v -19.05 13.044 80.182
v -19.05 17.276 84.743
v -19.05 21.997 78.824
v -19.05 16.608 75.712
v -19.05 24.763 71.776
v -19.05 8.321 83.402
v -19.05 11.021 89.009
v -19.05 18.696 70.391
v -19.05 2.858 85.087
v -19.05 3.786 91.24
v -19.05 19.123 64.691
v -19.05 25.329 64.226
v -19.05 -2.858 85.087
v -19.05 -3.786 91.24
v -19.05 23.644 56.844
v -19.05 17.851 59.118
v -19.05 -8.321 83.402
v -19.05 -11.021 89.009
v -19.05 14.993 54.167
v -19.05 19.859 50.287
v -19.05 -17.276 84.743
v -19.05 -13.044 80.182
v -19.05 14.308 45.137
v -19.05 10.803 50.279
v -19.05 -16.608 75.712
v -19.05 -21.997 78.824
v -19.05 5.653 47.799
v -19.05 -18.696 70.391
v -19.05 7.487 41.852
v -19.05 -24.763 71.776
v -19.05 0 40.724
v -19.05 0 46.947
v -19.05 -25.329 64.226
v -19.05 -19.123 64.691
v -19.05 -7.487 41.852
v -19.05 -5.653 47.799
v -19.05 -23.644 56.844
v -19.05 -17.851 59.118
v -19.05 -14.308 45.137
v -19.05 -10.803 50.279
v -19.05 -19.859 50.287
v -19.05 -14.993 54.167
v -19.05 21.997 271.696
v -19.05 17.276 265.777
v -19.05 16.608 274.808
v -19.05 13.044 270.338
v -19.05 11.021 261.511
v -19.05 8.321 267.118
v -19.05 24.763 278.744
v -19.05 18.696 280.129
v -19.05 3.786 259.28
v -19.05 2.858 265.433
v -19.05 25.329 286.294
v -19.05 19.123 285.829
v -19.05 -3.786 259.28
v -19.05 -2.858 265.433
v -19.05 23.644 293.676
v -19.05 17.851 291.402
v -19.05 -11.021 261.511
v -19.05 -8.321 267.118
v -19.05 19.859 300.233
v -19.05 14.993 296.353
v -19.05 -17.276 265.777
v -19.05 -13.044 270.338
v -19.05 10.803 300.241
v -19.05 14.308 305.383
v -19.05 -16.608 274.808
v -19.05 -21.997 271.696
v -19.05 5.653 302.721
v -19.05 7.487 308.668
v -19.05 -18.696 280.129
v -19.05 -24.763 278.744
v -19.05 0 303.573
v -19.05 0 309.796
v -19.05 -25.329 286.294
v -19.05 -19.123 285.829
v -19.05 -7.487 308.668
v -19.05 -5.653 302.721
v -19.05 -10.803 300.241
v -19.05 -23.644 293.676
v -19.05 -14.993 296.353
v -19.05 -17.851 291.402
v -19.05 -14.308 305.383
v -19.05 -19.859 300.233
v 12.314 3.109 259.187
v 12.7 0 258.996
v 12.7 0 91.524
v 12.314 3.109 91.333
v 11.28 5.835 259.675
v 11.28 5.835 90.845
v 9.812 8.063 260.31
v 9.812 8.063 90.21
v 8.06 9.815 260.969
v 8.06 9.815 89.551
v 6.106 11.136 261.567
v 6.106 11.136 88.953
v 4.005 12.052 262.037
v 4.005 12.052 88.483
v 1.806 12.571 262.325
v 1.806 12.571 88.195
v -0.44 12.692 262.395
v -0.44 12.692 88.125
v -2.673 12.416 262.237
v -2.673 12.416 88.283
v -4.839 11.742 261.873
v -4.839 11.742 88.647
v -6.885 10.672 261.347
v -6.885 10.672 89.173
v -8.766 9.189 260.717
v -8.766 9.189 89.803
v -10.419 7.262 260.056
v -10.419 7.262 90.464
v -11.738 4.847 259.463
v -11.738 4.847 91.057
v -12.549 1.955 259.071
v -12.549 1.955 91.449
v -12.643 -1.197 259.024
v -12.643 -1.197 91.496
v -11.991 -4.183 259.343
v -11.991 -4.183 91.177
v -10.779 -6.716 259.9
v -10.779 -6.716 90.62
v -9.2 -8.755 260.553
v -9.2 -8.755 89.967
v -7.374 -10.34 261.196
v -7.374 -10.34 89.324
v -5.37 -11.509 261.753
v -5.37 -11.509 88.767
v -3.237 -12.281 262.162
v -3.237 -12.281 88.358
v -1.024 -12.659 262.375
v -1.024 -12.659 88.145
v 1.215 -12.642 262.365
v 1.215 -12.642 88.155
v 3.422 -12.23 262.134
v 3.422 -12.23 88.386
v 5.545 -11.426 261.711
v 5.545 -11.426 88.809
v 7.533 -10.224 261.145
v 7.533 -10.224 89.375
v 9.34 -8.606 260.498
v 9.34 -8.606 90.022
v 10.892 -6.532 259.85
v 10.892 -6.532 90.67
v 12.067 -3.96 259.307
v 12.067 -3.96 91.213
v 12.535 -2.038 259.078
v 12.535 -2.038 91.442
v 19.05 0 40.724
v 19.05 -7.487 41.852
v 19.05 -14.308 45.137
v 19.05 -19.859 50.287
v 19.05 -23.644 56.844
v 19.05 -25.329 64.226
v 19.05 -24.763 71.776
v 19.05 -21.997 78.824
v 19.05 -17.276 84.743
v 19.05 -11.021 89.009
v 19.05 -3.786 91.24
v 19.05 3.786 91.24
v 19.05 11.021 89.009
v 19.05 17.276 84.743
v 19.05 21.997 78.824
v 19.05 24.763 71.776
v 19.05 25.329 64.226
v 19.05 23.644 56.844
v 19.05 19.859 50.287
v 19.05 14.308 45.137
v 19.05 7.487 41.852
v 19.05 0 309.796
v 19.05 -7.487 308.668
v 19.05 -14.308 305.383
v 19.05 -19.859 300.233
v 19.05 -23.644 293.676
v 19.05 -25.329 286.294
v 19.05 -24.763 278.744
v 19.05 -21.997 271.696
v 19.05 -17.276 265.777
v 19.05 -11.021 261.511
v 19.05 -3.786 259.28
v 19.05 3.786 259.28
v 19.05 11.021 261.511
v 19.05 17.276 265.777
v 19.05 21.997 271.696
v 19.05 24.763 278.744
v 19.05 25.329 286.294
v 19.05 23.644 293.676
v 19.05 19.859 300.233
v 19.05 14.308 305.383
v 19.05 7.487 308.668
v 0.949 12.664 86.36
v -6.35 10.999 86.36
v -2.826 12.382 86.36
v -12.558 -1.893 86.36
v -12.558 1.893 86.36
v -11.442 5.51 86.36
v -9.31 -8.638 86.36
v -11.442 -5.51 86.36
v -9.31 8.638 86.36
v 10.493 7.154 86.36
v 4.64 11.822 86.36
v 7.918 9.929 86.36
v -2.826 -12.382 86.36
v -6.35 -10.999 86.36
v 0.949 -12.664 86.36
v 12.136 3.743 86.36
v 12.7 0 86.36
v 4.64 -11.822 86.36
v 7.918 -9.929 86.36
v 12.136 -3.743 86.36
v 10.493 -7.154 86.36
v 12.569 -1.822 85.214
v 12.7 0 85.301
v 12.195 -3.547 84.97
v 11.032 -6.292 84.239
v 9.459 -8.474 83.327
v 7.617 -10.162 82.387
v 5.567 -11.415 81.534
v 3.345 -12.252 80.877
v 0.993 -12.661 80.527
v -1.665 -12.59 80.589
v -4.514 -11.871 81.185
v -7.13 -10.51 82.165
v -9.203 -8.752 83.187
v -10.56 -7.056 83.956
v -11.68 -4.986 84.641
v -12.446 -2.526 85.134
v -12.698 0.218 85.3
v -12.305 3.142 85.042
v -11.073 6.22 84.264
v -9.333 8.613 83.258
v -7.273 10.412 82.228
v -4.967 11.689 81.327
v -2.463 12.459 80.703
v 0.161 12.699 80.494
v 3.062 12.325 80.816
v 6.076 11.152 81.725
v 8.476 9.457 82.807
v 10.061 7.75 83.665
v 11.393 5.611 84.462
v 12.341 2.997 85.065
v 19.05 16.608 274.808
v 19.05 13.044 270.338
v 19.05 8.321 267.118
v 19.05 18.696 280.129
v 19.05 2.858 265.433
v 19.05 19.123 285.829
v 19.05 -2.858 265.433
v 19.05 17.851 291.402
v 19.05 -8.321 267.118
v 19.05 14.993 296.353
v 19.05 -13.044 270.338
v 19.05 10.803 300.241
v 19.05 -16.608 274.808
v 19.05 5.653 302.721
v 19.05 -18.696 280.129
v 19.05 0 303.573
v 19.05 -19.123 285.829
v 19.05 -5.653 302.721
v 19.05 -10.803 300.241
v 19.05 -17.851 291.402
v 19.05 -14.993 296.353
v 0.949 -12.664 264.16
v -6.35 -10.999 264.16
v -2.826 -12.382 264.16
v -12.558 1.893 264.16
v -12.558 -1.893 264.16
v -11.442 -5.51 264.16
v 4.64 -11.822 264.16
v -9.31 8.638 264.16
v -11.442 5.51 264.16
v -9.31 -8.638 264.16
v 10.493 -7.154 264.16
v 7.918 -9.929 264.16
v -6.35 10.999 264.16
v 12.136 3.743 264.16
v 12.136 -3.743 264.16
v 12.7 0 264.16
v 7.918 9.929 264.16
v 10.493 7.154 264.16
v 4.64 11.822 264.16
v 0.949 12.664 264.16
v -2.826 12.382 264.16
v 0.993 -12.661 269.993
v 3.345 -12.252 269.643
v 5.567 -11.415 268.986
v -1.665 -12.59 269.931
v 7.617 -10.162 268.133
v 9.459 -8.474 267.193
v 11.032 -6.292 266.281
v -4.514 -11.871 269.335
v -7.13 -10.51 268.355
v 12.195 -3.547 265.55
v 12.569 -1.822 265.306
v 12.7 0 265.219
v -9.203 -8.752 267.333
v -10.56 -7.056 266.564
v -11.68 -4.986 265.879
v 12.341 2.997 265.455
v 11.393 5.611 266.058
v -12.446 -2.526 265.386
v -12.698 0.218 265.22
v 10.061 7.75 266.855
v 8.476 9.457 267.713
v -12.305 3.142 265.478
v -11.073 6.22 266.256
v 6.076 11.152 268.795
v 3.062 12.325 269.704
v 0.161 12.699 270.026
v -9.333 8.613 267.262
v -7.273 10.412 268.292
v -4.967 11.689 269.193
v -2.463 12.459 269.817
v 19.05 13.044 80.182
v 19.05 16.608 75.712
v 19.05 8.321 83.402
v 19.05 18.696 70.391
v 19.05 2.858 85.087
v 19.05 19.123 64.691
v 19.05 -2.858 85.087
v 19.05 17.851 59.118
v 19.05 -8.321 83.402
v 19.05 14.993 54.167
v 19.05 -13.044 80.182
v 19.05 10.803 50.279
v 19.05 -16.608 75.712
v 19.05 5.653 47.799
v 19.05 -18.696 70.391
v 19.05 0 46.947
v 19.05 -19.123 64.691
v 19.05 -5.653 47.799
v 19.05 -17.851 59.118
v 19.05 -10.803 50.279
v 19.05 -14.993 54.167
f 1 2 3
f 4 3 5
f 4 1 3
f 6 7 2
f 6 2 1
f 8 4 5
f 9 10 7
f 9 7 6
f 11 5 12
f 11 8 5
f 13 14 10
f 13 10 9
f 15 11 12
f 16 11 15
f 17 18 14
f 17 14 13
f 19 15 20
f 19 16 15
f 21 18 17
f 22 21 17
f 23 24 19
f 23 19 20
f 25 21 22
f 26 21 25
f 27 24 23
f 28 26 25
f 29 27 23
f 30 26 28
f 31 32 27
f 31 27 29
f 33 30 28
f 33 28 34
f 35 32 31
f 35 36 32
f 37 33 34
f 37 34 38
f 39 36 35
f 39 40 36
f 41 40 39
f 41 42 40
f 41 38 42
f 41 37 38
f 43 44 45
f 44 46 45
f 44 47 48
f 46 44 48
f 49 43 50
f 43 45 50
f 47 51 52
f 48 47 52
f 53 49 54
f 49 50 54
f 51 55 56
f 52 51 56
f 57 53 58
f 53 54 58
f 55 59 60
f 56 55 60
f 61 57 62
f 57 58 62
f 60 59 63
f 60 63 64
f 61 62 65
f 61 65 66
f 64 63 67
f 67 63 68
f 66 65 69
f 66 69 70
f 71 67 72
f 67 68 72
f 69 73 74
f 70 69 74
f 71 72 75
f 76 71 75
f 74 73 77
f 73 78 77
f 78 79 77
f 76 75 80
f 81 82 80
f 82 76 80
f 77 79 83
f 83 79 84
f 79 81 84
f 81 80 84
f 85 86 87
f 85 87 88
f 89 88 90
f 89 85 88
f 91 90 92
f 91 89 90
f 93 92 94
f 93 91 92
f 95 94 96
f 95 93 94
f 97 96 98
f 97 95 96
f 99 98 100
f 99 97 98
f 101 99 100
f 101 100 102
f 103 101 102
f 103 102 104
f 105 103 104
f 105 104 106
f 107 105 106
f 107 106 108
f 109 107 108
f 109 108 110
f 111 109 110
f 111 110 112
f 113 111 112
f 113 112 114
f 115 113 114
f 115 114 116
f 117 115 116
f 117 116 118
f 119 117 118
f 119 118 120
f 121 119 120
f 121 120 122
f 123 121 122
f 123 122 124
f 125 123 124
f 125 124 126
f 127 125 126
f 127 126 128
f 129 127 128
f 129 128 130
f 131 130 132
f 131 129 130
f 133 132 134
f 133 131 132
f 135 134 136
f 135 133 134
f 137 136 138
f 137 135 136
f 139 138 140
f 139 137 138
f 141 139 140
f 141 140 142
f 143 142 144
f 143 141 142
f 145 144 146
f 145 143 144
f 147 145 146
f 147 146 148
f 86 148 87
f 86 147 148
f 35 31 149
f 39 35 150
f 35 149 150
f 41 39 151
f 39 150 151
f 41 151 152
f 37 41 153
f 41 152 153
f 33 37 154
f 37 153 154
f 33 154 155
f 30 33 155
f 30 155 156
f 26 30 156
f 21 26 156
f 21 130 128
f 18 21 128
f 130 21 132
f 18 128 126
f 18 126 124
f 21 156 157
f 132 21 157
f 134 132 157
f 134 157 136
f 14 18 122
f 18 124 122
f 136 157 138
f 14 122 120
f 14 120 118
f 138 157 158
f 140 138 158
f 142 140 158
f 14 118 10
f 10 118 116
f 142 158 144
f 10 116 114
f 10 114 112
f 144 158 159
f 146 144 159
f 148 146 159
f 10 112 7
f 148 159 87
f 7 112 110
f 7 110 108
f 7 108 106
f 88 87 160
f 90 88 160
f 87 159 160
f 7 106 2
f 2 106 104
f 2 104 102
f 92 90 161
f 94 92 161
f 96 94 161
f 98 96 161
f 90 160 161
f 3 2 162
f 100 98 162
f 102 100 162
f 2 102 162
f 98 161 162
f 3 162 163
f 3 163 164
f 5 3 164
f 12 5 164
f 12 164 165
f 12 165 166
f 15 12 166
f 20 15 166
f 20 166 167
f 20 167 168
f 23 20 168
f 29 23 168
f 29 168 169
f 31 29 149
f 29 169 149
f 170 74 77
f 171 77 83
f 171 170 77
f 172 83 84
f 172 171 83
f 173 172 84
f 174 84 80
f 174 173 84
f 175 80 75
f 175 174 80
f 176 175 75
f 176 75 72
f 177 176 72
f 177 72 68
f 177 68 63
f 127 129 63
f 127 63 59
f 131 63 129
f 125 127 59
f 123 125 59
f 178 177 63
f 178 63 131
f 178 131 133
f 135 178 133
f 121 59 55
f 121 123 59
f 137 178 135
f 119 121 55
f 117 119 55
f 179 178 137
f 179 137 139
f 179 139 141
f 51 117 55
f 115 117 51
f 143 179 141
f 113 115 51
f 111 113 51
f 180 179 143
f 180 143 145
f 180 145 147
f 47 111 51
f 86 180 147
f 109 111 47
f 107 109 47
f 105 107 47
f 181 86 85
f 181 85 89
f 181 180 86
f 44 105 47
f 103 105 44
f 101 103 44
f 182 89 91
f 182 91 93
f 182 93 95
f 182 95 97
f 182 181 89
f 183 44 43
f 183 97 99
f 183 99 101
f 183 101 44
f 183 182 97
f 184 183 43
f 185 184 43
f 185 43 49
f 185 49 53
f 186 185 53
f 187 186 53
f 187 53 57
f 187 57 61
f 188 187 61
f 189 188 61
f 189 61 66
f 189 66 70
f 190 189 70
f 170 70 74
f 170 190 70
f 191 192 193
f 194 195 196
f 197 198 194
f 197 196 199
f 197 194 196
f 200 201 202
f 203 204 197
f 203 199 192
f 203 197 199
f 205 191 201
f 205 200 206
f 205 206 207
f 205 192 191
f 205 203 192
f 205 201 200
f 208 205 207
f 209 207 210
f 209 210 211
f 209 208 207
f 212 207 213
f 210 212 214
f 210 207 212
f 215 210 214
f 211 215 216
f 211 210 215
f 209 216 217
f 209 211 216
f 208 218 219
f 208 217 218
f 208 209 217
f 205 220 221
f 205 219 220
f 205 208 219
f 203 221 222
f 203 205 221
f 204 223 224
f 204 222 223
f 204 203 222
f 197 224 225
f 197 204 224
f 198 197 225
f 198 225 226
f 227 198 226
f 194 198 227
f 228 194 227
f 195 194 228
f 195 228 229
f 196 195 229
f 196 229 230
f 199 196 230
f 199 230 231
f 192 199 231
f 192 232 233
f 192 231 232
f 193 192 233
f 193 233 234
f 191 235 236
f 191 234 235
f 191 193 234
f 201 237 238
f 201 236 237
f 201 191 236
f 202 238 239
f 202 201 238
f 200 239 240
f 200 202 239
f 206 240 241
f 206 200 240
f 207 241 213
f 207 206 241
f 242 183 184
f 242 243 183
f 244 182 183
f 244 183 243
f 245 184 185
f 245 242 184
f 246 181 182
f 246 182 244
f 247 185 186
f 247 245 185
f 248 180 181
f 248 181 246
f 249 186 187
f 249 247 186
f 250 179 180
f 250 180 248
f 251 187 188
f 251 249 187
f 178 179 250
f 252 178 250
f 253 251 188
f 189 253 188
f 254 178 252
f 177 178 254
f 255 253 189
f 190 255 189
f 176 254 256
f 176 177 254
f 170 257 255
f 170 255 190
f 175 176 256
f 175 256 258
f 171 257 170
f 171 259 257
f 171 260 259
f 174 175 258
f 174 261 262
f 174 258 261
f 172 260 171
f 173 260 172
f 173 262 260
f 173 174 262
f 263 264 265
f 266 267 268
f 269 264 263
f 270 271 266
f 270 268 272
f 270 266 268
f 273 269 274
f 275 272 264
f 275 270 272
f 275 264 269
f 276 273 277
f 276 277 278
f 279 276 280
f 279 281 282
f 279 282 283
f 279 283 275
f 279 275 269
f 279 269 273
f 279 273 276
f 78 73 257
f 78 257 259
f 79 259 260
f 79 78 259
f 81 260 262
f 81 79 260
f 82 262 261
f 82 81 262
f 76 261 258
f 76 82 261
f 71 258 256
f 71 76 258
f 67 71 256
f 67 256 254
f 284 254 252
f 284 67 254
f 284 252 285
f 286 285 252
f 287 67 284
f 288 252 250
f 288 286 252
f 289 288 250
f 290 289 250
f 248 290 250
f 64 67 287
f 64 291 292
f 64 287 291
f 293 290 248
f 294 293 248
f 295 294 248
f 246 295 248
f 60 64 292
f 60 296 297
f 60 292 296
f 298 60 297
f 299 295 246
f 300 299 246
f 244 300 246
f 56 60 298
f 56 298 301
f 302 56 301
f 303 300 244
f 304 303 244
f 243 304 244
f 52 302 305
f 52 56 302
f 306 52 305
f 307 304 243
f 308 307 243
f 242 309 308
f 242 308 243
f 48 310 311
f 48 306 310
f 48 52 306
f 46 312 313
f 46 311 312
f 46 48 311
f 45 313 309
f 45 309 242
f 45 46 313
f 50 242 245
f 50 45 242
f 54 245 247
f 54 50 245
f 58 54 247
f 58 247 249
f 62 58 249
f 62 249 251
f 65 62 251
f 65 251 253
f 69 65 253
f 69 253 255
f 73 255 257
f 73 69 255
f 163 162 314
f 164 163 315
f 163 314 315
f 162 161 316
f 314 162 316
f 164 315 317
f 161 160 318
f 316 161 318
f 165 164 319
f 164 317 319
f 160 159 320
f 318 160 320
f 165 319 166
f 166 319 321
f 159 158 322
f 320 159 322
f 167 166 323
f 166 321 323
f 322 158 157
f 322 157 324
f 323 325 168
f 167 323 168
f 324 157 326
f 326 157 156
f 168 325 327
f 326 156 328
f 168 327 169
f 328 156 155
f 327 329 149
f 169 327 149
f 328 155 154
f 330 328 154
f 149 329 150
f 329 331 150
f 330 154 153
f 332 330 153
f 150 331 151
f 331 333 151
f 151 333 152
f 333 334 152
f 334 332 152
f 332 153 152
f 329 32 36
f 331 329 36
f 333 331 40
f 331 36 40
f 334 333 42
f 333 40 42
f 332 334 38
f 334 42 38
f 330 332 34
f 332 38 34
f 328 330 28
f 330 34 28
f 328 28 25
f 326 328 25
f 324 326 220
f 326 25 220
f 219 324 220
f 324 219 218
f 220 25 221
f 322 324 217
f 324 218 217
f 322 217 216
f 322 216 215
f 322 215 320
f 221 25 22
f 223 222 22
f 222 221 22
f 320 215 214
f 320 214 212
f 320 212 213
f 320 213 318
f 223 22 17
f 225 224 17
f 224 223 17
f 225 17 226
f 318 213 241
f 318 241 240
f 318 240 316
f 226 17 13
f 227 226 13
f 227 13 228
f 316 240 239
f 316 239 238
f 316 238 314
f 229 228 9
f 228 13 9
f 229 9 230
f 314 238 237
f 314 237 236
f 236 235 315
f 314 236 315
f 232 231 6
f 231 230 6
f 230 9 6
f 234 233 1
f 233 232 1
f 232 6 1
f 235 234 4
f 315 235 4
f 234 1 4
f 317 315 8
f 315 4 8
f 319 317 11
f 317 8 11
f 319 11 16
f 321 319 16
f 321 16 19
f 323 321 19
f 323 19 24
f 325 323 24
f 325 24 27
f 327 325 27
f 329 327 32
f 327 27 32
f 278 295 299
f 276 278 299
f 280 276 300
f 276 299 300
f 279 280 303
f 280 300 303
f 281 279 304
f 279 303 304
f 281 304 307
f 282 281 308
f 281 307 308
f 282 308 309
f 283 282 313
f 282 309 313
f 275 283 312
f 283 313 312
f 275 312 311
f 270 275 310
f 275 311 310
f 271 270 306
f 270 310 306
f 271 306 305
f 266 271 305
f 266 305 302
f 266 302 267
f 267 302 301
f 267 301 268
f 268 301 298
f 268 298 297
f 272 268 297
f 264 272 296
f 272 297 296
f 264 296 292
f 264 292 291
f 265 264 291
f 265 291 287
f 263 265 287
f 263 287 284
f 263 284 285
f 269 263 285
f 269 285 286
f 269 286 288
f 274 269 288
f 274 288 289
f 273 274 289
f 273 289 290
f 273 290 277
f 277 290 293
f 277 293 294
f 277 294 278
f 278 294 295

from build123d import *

# Parameters (mm, degrees)
SKETCH4_R           = 25.4
SKETCH4_R_2         = 19.177
BOSS_EXTRUDE3_DEPTH = 19.05
SKETCH6_R           = 12.7
BOSS_EXTRUDE4_DEPTH = 203.2
CUT_EXTRUDE2_START  = -12.7
SKETCH8_R           = 12.7
CUT_EXTRUDE2_DEPTH  = 12.7
SKETCH9_R           = 12.7
CUT_EXTRUDE4_DEPTH  = 12.7


with BuildPart() as part:
    # Sketch4 → Boss-Extrude3 (new, symmetric)
    with BuildSketch(Plane(origin=(0, 0, 0), x_dir=(0, 0, -1), z_dir=(1, 0, 0))):
        with Locations(Location((-284.396079729, 0, 0), (0, 0, 180))):
            Circle(SKETCH4_R)
        with Locations(Location((-284.396079729, 0, 0), (0, 0, 180))):
            Circle(SKETCH4_R_2, mode=Mode.SUBTRACT)
    boss_extrude3 = extrude(amount=BOSS_EXTRUDE3_DEPTH, both=True)

    # Sketch6 → Boss-Extrude4 (add)
    with BuildSketch(Plane.XY.offset(276.86)):
        Circle(SKETCH6_R)
    extrude(amount=-BOSS_EXTRUDE4_DEPTH)

    # Mirror1: Boss-Extrude3 across plane
    add(boss_extrude3.mirror(Plane(origin=(0, 0, 175.26), x_dir=(1, 0, 0), z_dir=(0, 0, -1))))

    # Sketch8 → Cut-Extrude2 (cut)
    with BuildSketch(Plane(origin=(0, 0, 73.66), x_dir=(-1, 0, 0), z_dir=(0, 0, -1)).offset(CUT_EXTRUDE2_START)):
        with Locations(Location((0, 0, 0), (0, 0, 180))):
            Circle(SKETCH8_R)
    extrude(amount=CUT_EXTRUDE2_DEPTH, mode=Mode.SUBTRACT)

    # Sketch9 → Cut-Extrude4 (cut)
    with BuildSketch(Plane.XY.offset(276.86)):
        Circle(SKETCH9_R)
    extrude(amount=-CUT_EXTRUDE4_DEPTH, mode=Mode.SUBTRACT)


solid = part.part
